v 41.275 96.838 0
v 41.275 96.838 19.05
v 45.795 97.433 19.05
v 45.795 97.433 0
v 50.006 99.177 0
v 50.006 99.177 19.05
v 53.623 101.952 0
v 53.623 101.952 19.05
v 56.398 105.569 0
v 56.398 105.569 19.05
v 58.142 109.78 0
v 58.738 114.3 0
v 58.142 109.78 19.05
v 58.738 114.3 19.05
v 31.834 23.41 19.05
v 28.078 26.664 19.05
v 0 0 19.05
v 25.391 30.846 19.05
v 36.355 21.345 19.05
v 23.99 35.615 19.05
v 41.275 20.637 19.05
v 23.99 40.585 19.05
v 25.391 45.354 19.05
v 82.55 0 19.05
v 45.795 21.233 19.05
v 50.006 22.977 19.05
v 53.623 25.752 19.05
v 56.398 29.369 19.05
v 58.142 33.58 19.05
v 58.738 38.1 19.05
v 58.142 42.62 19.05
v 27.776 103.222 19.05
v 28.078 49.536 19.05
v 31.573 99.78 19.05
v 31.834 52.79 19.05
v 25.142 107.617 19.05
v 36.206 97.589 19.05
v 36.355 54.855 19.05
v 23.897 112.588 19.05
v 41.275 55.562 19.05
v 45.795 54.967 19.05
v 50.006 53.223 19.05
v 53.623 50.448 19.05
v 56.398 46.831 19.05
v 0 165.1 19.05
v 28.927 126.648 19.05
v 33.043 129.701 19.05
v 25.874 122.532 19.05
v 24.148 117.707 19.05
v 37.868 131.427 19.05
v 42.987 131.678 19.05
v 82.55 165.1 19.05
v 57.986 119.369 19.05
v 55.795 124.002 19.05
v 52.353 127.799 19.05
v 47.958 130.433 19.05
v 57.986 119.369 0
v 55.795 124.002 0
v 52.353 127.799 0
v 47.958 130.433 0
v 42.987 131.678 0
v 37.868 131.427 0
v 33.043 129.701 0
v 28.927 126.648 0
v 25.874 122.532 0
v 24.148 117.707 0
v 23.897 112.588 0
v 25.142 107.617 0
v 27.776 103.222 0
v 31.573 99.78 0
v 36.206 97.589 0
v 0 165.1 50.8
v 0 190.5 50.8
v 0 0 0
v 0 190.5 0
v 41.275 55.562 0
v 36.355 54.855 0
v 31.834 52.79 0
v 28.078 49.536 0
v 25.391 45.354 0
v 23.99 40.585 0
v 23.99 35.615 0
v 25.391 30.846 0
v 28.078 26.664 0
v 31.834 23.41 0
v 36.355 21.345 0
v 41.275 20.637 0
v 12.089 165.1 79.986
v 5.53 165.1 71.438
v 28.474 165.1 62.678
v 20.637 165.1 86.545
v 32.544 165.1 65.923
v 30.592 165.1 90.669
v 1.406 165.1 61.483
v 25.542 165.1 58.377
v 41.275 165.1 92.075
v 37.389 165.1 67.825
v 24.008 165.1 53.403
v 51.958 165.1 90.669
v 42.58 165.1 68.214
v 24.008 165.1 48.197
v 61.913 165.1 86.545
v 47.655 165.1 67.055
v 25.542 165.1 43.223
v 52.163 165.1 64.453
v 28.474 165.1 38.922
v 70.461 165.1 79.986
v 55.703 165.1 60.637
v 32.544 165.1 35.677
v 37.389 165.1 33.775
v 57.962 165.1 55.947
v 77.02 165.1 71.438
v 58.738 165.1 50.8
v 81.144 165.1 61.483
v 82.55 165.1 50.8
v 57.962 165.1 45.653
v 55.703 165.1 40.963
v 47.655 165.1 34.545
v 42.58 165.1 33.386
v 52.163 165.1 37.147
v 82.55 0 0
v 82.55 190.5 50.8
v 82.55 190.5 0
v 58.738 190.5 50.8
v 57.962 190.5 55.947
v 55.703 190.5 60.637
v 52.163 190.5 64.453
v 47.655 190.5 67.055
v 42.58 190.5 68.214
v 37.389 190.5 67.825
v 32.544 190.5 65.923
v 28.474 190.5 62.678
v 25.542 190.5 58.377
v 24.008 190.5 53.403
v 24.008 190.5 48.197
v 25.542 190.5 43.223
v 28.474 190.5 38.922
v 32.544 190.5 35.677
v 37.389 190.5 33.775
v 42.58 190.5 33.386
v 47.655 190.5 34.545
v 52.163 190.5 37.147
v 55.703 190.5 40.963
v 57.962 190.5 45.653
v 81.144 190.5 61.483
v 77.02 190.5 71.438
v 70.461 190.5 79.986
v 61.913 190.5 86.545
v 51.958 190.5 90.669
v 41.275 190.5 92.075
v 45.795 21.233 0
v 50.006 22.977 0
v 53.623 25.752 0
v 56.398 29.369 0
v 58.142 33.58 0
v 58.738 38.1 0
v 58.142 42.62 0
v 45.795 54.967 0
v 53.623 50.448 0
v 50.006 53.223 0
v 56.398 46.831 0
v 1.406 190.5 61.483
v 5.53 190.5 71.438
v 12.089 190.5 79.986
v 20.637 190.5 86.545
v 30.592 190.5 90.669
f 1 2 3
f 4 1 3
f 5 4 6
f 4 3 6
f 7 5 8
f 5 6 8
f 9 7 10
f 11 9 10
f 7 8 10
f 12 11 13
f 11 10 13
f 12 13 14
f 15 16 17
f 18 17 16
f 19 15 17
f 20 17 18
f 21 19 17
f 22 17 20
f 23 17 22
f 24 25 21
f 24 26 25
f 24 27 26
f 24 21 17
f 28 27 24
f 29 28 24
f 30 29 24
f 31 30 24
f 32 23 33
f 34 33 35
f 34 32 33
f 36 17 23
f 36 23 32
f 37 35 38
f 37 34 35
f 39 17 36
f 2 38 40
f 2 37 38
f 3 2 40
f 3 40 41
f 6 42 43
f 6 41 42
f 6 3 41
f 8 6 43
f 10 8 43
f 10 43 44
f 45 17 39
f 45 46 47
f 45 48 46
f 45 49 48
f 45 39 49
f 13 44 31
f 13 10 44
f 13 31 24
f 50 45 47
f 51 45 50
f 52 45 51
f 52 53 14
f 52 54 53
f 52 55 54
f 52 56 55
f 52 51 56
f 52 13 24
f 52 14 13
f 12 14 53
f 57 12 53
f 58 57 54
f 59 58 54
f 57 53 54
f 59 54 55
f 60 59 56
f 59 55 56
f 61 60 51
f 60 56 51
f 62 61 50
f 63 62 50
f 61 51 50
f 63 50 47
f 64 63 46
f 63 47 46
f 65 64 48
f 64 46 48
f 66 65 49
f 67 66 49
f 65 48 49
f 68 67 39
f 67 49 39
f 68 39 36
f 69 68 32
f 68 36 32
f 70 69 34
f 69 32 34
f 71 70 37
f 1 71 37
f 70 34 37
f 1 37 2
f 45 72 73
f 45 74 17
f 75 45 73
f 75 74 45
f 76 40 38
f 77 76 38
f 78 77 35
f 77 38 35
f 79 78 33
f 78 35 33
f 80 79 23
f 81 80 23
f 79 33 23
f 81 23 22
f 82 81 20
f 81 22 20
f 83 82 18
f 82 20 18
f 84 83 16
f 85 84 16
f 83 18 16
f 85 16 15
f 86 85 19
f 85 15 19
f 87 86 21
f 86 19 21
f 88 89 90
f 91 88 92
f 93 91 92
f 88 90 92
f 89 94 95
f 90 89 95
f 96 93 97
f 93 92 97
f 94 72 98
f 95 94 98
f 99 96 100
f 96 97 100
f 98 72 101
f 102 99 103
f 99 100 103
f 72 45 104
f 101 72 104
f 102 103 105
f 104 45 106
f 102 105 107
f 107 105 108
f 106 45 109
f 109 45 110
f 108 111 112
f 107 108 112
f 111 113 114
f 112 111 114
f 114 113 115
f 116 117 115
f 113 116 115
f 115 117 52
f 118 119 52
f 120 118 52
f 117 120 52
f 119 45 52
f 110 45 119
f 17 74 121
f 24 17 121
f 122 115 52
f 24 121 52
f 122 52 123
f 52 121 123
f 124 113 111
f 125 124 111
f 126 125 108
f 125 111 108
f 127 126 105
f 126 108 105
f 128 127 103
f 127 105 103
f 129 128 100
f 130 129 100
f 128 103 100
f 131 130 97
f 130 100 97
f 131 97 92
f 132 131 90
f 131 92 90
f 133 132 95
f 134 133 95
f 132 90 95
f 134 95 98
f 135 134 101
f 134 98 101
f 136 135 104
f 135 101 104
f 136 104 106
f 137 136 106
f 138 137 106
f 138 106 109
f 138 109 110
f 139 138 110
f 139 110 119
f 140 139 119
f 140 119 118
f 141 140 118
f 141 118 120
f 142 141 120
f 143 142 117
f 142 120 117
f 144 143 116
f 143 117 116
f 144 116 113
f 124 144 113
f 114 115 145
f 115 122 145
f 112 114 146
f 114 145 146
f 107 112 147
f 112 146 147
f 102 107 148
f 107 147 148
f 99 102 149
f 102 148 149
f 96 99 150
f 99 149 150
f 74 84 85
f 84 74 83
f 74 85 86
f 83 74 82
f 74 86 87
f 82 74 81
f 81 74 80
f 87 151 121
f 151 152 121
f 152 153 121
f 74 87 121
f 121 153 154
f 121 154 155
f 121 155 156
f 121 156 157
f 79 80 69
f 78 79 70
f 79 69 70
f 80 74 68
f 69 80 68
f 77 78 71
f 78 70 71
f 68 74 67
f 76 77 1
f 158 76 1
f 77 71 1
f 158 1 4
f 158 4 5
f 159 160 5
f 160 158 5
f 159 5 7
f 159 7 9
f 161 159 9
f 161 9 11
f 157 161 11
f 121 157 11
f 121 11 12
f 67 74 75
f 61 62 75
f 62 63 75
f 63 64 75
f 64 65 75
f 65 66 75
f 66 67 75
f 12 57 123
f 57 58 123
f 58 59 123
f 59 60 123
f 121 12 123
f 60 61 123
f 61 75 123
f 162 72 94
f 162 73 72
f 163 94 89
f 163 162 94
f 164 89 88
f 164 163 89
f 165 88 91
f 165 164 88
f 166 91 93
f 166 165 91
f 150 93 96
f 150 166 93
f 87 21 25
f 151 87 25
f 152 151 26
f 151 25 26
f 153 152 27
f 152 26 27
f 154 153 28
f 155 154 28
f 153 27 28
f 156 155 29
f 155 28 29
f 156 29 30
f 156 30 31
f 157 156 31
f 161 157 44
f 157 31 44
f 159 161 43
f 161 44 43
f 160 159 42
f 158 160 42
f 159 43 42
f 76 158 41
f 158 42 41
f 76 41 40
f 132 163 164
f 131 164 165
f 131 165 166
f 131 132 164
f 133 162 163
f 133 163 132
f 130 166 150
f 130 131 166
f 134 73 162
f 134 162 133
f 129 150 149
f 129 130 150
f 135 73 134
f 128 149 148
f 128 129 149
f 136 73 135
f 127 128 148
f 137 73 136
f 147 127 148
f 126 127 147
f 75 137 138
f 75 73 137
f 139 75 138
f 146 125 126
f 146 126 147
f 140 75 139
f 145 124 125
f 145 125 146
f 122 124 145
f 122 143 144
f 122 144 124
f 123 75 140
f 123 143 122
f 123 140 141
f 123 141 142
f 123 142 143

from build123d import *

# Parameters (mm, degrees)
F0_W     = 82.55
F0_H     = 190.5
F1_DEPTH = 19.05
F2_W     = 82.55
F2_H     = 25.4
F3_DEPTH = 73.025
F4_R     = 41.27499
F5_R     = 17.4625
F6_DEPTH = 25.4
F8_DEPTH = 25.4


# Not quite as in the source:
# - a fillet or chamfer is up to 0.001 mm smaller than in the source, because OpenCascade refuses the exact size


with BuildPart() as f1:
    # F0 (on Top) → F1 (new body)
    with BuildSketch(Plane.XY):
        with Locations((41.275, 95.25)):
            Rectangle(F0_W, F0_H)
    extrude(amount=F1_DEPTH)

    # F2 (on face) → F3 (join)
    with BuildSketch(Plane.XY.offset(19.05)):
        with Locations((41.275, 177.8)):
            Rectangle(F2_W, F2_H)
    extrude(amount=F3_DEPTH)

    # F4 (radius 41.275 in the source; OpenCascade refuses exactly that, so slightly less here)
    f4_edges = [f1.edges().sort_by_distance(p)[0] for p in [
        (0, 177.8, 92.075),
        (82.55, 177.8, 92.075),
    ]]
    fillet(f4_edges, radius=F4_R)

    # F5 (on face) → F6 (cut)
    with BuildSketch(Plane.XZ.offset(-165.1)):
        with Locations((41.275, 50.8)):
            Circle(F5_R)
    extrude(amount=-F6_DEPTH, mode=Mode.SUBTRACT)

    # F7 (on face) → F8 (cut)
    with BuildSketch(Plane.XY.offset(19.05)):
        with BuildLine():
            ThreePointArc((58.7375, 114.3), (28.9271478335, 126.6478521665), (41.275, 96.8375))
            ThreePointArc((41.275, 96.8375), (53.6228521665, 101.9521478335), (58.7375, 114.3))
        make_face()
        with BuildLine():
            Line((41.275, 38.1), (41.275, 20.6375))
            ThreePointArc((41.275, 20.6375), (53.6228521665, 25.7521478335), (58.7375, 38.1))
            ThreePointArc((58.7375, 38.1), (53.6228521665, 50.4478521665), (41.275, 55.5625))
            Line((41.275, 55.5625), (41.275, 38.1))
        make_face()
        with BuildLine():
            ThreePointArc((41.275, 55.5625), (23.8125, 38.1), (41.275, 20.6375))
            Line((41.275, 20.6375), (41.275, 38.1))
            Line((41.275, 38.1), (41.275, 55.5625))
        make_face()
    extrude(amount=-F8_DEPTH, mode=Mode.SUBTRACT)


solid = f1.part
